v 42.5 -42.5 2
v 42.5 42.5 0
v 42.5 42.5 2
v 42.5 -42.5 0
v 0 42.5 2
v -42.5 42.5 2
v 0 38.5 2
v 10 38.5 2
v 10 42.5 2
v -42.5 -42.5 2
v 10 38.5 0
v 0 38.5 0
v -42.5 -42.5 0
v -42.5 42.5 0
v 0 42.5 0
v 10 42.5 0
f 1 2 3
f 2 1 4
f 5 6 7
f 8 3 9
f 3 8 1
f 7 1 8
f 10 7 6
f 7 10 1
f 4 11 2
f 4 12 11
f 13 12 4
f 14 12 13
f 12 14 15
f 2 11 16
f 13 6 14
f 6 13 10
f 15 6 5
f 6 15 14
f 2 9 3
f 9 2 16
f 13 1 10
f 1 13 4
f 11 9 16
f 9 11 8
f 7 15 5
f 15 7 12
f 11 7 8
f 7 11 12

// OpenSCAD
// Sowing template for 90mm Petri dish - flat disc with grid holes and orientation notch.

// Dimensions
DISH_DIA = 90;
DISC_DIA = 85;
THICKNESS = 2;
HOLE_COUNT = 7;
HOLE_DIA = 3;
HOLE_SPACING = 9;
NOTCH_WIDTH = 10;
NOTCH_DEPTH = 4;

$fn = 64;

// Calculate grid offsets to center the grid on the origin
// For 7 holes, indices are 0..6. Center index is 3.
// Offset = (index - 3) * spacing
grid_offset = (HOLE_COUNT - 1) / 2 * HOLE_SPACING;

difference() {
    // Main disc body
    translate([-DISC_DIA / 2, -DISC_DIA / 2, 0])
        cube([DISC_DIA, DISC_DIA, THICKNESS]);

    // Grid of holes
    for (i = [0 : HOLE_COUNT - 1]) {
        x_pos = (i - grid_offset) * HOLE_SPACING;
        
        // Cut hole through the entire thickness
        translate([x_pos, 0, -1])
            cylinder(h = THICKNESS + 2, d = HOLE_DIA);
    }

    // Orientation notch on the +Y side
    // Notch is centered on Y axis, so its center Y is 0.
    // It extends from -NOTCH_WIDTH/2 to +NOTCH_WIDTH/2 in X.
    // It cuts into the disc from the rim inward.
    // Rim Y is DISC_DIA/2. Notch starts at DISC_DIA/2 - NOTCH_DEPTH.
    
    notch_y_start = DISC_DIA / 2 - NOTCH_DEPTH;
    notch_y_end = DISC_DIA / 2;
    
    // Create the notch shape (a rectangular prism)
    // We position it so it cuts into the disc.
    // The notch is 10mm wide in X, centered at X=0.
    // The notch is 4mm deep in Y, starting at Y = notch_y_start.
    // The notch has the full thickness of the disc (plus a bit to ensure clean cut).
    
    translate([0, notch_y_start, -1])
        cube([NOTCH_WIDTH, NOTCH_DEPTH, THICKNESS + 2]);
}
